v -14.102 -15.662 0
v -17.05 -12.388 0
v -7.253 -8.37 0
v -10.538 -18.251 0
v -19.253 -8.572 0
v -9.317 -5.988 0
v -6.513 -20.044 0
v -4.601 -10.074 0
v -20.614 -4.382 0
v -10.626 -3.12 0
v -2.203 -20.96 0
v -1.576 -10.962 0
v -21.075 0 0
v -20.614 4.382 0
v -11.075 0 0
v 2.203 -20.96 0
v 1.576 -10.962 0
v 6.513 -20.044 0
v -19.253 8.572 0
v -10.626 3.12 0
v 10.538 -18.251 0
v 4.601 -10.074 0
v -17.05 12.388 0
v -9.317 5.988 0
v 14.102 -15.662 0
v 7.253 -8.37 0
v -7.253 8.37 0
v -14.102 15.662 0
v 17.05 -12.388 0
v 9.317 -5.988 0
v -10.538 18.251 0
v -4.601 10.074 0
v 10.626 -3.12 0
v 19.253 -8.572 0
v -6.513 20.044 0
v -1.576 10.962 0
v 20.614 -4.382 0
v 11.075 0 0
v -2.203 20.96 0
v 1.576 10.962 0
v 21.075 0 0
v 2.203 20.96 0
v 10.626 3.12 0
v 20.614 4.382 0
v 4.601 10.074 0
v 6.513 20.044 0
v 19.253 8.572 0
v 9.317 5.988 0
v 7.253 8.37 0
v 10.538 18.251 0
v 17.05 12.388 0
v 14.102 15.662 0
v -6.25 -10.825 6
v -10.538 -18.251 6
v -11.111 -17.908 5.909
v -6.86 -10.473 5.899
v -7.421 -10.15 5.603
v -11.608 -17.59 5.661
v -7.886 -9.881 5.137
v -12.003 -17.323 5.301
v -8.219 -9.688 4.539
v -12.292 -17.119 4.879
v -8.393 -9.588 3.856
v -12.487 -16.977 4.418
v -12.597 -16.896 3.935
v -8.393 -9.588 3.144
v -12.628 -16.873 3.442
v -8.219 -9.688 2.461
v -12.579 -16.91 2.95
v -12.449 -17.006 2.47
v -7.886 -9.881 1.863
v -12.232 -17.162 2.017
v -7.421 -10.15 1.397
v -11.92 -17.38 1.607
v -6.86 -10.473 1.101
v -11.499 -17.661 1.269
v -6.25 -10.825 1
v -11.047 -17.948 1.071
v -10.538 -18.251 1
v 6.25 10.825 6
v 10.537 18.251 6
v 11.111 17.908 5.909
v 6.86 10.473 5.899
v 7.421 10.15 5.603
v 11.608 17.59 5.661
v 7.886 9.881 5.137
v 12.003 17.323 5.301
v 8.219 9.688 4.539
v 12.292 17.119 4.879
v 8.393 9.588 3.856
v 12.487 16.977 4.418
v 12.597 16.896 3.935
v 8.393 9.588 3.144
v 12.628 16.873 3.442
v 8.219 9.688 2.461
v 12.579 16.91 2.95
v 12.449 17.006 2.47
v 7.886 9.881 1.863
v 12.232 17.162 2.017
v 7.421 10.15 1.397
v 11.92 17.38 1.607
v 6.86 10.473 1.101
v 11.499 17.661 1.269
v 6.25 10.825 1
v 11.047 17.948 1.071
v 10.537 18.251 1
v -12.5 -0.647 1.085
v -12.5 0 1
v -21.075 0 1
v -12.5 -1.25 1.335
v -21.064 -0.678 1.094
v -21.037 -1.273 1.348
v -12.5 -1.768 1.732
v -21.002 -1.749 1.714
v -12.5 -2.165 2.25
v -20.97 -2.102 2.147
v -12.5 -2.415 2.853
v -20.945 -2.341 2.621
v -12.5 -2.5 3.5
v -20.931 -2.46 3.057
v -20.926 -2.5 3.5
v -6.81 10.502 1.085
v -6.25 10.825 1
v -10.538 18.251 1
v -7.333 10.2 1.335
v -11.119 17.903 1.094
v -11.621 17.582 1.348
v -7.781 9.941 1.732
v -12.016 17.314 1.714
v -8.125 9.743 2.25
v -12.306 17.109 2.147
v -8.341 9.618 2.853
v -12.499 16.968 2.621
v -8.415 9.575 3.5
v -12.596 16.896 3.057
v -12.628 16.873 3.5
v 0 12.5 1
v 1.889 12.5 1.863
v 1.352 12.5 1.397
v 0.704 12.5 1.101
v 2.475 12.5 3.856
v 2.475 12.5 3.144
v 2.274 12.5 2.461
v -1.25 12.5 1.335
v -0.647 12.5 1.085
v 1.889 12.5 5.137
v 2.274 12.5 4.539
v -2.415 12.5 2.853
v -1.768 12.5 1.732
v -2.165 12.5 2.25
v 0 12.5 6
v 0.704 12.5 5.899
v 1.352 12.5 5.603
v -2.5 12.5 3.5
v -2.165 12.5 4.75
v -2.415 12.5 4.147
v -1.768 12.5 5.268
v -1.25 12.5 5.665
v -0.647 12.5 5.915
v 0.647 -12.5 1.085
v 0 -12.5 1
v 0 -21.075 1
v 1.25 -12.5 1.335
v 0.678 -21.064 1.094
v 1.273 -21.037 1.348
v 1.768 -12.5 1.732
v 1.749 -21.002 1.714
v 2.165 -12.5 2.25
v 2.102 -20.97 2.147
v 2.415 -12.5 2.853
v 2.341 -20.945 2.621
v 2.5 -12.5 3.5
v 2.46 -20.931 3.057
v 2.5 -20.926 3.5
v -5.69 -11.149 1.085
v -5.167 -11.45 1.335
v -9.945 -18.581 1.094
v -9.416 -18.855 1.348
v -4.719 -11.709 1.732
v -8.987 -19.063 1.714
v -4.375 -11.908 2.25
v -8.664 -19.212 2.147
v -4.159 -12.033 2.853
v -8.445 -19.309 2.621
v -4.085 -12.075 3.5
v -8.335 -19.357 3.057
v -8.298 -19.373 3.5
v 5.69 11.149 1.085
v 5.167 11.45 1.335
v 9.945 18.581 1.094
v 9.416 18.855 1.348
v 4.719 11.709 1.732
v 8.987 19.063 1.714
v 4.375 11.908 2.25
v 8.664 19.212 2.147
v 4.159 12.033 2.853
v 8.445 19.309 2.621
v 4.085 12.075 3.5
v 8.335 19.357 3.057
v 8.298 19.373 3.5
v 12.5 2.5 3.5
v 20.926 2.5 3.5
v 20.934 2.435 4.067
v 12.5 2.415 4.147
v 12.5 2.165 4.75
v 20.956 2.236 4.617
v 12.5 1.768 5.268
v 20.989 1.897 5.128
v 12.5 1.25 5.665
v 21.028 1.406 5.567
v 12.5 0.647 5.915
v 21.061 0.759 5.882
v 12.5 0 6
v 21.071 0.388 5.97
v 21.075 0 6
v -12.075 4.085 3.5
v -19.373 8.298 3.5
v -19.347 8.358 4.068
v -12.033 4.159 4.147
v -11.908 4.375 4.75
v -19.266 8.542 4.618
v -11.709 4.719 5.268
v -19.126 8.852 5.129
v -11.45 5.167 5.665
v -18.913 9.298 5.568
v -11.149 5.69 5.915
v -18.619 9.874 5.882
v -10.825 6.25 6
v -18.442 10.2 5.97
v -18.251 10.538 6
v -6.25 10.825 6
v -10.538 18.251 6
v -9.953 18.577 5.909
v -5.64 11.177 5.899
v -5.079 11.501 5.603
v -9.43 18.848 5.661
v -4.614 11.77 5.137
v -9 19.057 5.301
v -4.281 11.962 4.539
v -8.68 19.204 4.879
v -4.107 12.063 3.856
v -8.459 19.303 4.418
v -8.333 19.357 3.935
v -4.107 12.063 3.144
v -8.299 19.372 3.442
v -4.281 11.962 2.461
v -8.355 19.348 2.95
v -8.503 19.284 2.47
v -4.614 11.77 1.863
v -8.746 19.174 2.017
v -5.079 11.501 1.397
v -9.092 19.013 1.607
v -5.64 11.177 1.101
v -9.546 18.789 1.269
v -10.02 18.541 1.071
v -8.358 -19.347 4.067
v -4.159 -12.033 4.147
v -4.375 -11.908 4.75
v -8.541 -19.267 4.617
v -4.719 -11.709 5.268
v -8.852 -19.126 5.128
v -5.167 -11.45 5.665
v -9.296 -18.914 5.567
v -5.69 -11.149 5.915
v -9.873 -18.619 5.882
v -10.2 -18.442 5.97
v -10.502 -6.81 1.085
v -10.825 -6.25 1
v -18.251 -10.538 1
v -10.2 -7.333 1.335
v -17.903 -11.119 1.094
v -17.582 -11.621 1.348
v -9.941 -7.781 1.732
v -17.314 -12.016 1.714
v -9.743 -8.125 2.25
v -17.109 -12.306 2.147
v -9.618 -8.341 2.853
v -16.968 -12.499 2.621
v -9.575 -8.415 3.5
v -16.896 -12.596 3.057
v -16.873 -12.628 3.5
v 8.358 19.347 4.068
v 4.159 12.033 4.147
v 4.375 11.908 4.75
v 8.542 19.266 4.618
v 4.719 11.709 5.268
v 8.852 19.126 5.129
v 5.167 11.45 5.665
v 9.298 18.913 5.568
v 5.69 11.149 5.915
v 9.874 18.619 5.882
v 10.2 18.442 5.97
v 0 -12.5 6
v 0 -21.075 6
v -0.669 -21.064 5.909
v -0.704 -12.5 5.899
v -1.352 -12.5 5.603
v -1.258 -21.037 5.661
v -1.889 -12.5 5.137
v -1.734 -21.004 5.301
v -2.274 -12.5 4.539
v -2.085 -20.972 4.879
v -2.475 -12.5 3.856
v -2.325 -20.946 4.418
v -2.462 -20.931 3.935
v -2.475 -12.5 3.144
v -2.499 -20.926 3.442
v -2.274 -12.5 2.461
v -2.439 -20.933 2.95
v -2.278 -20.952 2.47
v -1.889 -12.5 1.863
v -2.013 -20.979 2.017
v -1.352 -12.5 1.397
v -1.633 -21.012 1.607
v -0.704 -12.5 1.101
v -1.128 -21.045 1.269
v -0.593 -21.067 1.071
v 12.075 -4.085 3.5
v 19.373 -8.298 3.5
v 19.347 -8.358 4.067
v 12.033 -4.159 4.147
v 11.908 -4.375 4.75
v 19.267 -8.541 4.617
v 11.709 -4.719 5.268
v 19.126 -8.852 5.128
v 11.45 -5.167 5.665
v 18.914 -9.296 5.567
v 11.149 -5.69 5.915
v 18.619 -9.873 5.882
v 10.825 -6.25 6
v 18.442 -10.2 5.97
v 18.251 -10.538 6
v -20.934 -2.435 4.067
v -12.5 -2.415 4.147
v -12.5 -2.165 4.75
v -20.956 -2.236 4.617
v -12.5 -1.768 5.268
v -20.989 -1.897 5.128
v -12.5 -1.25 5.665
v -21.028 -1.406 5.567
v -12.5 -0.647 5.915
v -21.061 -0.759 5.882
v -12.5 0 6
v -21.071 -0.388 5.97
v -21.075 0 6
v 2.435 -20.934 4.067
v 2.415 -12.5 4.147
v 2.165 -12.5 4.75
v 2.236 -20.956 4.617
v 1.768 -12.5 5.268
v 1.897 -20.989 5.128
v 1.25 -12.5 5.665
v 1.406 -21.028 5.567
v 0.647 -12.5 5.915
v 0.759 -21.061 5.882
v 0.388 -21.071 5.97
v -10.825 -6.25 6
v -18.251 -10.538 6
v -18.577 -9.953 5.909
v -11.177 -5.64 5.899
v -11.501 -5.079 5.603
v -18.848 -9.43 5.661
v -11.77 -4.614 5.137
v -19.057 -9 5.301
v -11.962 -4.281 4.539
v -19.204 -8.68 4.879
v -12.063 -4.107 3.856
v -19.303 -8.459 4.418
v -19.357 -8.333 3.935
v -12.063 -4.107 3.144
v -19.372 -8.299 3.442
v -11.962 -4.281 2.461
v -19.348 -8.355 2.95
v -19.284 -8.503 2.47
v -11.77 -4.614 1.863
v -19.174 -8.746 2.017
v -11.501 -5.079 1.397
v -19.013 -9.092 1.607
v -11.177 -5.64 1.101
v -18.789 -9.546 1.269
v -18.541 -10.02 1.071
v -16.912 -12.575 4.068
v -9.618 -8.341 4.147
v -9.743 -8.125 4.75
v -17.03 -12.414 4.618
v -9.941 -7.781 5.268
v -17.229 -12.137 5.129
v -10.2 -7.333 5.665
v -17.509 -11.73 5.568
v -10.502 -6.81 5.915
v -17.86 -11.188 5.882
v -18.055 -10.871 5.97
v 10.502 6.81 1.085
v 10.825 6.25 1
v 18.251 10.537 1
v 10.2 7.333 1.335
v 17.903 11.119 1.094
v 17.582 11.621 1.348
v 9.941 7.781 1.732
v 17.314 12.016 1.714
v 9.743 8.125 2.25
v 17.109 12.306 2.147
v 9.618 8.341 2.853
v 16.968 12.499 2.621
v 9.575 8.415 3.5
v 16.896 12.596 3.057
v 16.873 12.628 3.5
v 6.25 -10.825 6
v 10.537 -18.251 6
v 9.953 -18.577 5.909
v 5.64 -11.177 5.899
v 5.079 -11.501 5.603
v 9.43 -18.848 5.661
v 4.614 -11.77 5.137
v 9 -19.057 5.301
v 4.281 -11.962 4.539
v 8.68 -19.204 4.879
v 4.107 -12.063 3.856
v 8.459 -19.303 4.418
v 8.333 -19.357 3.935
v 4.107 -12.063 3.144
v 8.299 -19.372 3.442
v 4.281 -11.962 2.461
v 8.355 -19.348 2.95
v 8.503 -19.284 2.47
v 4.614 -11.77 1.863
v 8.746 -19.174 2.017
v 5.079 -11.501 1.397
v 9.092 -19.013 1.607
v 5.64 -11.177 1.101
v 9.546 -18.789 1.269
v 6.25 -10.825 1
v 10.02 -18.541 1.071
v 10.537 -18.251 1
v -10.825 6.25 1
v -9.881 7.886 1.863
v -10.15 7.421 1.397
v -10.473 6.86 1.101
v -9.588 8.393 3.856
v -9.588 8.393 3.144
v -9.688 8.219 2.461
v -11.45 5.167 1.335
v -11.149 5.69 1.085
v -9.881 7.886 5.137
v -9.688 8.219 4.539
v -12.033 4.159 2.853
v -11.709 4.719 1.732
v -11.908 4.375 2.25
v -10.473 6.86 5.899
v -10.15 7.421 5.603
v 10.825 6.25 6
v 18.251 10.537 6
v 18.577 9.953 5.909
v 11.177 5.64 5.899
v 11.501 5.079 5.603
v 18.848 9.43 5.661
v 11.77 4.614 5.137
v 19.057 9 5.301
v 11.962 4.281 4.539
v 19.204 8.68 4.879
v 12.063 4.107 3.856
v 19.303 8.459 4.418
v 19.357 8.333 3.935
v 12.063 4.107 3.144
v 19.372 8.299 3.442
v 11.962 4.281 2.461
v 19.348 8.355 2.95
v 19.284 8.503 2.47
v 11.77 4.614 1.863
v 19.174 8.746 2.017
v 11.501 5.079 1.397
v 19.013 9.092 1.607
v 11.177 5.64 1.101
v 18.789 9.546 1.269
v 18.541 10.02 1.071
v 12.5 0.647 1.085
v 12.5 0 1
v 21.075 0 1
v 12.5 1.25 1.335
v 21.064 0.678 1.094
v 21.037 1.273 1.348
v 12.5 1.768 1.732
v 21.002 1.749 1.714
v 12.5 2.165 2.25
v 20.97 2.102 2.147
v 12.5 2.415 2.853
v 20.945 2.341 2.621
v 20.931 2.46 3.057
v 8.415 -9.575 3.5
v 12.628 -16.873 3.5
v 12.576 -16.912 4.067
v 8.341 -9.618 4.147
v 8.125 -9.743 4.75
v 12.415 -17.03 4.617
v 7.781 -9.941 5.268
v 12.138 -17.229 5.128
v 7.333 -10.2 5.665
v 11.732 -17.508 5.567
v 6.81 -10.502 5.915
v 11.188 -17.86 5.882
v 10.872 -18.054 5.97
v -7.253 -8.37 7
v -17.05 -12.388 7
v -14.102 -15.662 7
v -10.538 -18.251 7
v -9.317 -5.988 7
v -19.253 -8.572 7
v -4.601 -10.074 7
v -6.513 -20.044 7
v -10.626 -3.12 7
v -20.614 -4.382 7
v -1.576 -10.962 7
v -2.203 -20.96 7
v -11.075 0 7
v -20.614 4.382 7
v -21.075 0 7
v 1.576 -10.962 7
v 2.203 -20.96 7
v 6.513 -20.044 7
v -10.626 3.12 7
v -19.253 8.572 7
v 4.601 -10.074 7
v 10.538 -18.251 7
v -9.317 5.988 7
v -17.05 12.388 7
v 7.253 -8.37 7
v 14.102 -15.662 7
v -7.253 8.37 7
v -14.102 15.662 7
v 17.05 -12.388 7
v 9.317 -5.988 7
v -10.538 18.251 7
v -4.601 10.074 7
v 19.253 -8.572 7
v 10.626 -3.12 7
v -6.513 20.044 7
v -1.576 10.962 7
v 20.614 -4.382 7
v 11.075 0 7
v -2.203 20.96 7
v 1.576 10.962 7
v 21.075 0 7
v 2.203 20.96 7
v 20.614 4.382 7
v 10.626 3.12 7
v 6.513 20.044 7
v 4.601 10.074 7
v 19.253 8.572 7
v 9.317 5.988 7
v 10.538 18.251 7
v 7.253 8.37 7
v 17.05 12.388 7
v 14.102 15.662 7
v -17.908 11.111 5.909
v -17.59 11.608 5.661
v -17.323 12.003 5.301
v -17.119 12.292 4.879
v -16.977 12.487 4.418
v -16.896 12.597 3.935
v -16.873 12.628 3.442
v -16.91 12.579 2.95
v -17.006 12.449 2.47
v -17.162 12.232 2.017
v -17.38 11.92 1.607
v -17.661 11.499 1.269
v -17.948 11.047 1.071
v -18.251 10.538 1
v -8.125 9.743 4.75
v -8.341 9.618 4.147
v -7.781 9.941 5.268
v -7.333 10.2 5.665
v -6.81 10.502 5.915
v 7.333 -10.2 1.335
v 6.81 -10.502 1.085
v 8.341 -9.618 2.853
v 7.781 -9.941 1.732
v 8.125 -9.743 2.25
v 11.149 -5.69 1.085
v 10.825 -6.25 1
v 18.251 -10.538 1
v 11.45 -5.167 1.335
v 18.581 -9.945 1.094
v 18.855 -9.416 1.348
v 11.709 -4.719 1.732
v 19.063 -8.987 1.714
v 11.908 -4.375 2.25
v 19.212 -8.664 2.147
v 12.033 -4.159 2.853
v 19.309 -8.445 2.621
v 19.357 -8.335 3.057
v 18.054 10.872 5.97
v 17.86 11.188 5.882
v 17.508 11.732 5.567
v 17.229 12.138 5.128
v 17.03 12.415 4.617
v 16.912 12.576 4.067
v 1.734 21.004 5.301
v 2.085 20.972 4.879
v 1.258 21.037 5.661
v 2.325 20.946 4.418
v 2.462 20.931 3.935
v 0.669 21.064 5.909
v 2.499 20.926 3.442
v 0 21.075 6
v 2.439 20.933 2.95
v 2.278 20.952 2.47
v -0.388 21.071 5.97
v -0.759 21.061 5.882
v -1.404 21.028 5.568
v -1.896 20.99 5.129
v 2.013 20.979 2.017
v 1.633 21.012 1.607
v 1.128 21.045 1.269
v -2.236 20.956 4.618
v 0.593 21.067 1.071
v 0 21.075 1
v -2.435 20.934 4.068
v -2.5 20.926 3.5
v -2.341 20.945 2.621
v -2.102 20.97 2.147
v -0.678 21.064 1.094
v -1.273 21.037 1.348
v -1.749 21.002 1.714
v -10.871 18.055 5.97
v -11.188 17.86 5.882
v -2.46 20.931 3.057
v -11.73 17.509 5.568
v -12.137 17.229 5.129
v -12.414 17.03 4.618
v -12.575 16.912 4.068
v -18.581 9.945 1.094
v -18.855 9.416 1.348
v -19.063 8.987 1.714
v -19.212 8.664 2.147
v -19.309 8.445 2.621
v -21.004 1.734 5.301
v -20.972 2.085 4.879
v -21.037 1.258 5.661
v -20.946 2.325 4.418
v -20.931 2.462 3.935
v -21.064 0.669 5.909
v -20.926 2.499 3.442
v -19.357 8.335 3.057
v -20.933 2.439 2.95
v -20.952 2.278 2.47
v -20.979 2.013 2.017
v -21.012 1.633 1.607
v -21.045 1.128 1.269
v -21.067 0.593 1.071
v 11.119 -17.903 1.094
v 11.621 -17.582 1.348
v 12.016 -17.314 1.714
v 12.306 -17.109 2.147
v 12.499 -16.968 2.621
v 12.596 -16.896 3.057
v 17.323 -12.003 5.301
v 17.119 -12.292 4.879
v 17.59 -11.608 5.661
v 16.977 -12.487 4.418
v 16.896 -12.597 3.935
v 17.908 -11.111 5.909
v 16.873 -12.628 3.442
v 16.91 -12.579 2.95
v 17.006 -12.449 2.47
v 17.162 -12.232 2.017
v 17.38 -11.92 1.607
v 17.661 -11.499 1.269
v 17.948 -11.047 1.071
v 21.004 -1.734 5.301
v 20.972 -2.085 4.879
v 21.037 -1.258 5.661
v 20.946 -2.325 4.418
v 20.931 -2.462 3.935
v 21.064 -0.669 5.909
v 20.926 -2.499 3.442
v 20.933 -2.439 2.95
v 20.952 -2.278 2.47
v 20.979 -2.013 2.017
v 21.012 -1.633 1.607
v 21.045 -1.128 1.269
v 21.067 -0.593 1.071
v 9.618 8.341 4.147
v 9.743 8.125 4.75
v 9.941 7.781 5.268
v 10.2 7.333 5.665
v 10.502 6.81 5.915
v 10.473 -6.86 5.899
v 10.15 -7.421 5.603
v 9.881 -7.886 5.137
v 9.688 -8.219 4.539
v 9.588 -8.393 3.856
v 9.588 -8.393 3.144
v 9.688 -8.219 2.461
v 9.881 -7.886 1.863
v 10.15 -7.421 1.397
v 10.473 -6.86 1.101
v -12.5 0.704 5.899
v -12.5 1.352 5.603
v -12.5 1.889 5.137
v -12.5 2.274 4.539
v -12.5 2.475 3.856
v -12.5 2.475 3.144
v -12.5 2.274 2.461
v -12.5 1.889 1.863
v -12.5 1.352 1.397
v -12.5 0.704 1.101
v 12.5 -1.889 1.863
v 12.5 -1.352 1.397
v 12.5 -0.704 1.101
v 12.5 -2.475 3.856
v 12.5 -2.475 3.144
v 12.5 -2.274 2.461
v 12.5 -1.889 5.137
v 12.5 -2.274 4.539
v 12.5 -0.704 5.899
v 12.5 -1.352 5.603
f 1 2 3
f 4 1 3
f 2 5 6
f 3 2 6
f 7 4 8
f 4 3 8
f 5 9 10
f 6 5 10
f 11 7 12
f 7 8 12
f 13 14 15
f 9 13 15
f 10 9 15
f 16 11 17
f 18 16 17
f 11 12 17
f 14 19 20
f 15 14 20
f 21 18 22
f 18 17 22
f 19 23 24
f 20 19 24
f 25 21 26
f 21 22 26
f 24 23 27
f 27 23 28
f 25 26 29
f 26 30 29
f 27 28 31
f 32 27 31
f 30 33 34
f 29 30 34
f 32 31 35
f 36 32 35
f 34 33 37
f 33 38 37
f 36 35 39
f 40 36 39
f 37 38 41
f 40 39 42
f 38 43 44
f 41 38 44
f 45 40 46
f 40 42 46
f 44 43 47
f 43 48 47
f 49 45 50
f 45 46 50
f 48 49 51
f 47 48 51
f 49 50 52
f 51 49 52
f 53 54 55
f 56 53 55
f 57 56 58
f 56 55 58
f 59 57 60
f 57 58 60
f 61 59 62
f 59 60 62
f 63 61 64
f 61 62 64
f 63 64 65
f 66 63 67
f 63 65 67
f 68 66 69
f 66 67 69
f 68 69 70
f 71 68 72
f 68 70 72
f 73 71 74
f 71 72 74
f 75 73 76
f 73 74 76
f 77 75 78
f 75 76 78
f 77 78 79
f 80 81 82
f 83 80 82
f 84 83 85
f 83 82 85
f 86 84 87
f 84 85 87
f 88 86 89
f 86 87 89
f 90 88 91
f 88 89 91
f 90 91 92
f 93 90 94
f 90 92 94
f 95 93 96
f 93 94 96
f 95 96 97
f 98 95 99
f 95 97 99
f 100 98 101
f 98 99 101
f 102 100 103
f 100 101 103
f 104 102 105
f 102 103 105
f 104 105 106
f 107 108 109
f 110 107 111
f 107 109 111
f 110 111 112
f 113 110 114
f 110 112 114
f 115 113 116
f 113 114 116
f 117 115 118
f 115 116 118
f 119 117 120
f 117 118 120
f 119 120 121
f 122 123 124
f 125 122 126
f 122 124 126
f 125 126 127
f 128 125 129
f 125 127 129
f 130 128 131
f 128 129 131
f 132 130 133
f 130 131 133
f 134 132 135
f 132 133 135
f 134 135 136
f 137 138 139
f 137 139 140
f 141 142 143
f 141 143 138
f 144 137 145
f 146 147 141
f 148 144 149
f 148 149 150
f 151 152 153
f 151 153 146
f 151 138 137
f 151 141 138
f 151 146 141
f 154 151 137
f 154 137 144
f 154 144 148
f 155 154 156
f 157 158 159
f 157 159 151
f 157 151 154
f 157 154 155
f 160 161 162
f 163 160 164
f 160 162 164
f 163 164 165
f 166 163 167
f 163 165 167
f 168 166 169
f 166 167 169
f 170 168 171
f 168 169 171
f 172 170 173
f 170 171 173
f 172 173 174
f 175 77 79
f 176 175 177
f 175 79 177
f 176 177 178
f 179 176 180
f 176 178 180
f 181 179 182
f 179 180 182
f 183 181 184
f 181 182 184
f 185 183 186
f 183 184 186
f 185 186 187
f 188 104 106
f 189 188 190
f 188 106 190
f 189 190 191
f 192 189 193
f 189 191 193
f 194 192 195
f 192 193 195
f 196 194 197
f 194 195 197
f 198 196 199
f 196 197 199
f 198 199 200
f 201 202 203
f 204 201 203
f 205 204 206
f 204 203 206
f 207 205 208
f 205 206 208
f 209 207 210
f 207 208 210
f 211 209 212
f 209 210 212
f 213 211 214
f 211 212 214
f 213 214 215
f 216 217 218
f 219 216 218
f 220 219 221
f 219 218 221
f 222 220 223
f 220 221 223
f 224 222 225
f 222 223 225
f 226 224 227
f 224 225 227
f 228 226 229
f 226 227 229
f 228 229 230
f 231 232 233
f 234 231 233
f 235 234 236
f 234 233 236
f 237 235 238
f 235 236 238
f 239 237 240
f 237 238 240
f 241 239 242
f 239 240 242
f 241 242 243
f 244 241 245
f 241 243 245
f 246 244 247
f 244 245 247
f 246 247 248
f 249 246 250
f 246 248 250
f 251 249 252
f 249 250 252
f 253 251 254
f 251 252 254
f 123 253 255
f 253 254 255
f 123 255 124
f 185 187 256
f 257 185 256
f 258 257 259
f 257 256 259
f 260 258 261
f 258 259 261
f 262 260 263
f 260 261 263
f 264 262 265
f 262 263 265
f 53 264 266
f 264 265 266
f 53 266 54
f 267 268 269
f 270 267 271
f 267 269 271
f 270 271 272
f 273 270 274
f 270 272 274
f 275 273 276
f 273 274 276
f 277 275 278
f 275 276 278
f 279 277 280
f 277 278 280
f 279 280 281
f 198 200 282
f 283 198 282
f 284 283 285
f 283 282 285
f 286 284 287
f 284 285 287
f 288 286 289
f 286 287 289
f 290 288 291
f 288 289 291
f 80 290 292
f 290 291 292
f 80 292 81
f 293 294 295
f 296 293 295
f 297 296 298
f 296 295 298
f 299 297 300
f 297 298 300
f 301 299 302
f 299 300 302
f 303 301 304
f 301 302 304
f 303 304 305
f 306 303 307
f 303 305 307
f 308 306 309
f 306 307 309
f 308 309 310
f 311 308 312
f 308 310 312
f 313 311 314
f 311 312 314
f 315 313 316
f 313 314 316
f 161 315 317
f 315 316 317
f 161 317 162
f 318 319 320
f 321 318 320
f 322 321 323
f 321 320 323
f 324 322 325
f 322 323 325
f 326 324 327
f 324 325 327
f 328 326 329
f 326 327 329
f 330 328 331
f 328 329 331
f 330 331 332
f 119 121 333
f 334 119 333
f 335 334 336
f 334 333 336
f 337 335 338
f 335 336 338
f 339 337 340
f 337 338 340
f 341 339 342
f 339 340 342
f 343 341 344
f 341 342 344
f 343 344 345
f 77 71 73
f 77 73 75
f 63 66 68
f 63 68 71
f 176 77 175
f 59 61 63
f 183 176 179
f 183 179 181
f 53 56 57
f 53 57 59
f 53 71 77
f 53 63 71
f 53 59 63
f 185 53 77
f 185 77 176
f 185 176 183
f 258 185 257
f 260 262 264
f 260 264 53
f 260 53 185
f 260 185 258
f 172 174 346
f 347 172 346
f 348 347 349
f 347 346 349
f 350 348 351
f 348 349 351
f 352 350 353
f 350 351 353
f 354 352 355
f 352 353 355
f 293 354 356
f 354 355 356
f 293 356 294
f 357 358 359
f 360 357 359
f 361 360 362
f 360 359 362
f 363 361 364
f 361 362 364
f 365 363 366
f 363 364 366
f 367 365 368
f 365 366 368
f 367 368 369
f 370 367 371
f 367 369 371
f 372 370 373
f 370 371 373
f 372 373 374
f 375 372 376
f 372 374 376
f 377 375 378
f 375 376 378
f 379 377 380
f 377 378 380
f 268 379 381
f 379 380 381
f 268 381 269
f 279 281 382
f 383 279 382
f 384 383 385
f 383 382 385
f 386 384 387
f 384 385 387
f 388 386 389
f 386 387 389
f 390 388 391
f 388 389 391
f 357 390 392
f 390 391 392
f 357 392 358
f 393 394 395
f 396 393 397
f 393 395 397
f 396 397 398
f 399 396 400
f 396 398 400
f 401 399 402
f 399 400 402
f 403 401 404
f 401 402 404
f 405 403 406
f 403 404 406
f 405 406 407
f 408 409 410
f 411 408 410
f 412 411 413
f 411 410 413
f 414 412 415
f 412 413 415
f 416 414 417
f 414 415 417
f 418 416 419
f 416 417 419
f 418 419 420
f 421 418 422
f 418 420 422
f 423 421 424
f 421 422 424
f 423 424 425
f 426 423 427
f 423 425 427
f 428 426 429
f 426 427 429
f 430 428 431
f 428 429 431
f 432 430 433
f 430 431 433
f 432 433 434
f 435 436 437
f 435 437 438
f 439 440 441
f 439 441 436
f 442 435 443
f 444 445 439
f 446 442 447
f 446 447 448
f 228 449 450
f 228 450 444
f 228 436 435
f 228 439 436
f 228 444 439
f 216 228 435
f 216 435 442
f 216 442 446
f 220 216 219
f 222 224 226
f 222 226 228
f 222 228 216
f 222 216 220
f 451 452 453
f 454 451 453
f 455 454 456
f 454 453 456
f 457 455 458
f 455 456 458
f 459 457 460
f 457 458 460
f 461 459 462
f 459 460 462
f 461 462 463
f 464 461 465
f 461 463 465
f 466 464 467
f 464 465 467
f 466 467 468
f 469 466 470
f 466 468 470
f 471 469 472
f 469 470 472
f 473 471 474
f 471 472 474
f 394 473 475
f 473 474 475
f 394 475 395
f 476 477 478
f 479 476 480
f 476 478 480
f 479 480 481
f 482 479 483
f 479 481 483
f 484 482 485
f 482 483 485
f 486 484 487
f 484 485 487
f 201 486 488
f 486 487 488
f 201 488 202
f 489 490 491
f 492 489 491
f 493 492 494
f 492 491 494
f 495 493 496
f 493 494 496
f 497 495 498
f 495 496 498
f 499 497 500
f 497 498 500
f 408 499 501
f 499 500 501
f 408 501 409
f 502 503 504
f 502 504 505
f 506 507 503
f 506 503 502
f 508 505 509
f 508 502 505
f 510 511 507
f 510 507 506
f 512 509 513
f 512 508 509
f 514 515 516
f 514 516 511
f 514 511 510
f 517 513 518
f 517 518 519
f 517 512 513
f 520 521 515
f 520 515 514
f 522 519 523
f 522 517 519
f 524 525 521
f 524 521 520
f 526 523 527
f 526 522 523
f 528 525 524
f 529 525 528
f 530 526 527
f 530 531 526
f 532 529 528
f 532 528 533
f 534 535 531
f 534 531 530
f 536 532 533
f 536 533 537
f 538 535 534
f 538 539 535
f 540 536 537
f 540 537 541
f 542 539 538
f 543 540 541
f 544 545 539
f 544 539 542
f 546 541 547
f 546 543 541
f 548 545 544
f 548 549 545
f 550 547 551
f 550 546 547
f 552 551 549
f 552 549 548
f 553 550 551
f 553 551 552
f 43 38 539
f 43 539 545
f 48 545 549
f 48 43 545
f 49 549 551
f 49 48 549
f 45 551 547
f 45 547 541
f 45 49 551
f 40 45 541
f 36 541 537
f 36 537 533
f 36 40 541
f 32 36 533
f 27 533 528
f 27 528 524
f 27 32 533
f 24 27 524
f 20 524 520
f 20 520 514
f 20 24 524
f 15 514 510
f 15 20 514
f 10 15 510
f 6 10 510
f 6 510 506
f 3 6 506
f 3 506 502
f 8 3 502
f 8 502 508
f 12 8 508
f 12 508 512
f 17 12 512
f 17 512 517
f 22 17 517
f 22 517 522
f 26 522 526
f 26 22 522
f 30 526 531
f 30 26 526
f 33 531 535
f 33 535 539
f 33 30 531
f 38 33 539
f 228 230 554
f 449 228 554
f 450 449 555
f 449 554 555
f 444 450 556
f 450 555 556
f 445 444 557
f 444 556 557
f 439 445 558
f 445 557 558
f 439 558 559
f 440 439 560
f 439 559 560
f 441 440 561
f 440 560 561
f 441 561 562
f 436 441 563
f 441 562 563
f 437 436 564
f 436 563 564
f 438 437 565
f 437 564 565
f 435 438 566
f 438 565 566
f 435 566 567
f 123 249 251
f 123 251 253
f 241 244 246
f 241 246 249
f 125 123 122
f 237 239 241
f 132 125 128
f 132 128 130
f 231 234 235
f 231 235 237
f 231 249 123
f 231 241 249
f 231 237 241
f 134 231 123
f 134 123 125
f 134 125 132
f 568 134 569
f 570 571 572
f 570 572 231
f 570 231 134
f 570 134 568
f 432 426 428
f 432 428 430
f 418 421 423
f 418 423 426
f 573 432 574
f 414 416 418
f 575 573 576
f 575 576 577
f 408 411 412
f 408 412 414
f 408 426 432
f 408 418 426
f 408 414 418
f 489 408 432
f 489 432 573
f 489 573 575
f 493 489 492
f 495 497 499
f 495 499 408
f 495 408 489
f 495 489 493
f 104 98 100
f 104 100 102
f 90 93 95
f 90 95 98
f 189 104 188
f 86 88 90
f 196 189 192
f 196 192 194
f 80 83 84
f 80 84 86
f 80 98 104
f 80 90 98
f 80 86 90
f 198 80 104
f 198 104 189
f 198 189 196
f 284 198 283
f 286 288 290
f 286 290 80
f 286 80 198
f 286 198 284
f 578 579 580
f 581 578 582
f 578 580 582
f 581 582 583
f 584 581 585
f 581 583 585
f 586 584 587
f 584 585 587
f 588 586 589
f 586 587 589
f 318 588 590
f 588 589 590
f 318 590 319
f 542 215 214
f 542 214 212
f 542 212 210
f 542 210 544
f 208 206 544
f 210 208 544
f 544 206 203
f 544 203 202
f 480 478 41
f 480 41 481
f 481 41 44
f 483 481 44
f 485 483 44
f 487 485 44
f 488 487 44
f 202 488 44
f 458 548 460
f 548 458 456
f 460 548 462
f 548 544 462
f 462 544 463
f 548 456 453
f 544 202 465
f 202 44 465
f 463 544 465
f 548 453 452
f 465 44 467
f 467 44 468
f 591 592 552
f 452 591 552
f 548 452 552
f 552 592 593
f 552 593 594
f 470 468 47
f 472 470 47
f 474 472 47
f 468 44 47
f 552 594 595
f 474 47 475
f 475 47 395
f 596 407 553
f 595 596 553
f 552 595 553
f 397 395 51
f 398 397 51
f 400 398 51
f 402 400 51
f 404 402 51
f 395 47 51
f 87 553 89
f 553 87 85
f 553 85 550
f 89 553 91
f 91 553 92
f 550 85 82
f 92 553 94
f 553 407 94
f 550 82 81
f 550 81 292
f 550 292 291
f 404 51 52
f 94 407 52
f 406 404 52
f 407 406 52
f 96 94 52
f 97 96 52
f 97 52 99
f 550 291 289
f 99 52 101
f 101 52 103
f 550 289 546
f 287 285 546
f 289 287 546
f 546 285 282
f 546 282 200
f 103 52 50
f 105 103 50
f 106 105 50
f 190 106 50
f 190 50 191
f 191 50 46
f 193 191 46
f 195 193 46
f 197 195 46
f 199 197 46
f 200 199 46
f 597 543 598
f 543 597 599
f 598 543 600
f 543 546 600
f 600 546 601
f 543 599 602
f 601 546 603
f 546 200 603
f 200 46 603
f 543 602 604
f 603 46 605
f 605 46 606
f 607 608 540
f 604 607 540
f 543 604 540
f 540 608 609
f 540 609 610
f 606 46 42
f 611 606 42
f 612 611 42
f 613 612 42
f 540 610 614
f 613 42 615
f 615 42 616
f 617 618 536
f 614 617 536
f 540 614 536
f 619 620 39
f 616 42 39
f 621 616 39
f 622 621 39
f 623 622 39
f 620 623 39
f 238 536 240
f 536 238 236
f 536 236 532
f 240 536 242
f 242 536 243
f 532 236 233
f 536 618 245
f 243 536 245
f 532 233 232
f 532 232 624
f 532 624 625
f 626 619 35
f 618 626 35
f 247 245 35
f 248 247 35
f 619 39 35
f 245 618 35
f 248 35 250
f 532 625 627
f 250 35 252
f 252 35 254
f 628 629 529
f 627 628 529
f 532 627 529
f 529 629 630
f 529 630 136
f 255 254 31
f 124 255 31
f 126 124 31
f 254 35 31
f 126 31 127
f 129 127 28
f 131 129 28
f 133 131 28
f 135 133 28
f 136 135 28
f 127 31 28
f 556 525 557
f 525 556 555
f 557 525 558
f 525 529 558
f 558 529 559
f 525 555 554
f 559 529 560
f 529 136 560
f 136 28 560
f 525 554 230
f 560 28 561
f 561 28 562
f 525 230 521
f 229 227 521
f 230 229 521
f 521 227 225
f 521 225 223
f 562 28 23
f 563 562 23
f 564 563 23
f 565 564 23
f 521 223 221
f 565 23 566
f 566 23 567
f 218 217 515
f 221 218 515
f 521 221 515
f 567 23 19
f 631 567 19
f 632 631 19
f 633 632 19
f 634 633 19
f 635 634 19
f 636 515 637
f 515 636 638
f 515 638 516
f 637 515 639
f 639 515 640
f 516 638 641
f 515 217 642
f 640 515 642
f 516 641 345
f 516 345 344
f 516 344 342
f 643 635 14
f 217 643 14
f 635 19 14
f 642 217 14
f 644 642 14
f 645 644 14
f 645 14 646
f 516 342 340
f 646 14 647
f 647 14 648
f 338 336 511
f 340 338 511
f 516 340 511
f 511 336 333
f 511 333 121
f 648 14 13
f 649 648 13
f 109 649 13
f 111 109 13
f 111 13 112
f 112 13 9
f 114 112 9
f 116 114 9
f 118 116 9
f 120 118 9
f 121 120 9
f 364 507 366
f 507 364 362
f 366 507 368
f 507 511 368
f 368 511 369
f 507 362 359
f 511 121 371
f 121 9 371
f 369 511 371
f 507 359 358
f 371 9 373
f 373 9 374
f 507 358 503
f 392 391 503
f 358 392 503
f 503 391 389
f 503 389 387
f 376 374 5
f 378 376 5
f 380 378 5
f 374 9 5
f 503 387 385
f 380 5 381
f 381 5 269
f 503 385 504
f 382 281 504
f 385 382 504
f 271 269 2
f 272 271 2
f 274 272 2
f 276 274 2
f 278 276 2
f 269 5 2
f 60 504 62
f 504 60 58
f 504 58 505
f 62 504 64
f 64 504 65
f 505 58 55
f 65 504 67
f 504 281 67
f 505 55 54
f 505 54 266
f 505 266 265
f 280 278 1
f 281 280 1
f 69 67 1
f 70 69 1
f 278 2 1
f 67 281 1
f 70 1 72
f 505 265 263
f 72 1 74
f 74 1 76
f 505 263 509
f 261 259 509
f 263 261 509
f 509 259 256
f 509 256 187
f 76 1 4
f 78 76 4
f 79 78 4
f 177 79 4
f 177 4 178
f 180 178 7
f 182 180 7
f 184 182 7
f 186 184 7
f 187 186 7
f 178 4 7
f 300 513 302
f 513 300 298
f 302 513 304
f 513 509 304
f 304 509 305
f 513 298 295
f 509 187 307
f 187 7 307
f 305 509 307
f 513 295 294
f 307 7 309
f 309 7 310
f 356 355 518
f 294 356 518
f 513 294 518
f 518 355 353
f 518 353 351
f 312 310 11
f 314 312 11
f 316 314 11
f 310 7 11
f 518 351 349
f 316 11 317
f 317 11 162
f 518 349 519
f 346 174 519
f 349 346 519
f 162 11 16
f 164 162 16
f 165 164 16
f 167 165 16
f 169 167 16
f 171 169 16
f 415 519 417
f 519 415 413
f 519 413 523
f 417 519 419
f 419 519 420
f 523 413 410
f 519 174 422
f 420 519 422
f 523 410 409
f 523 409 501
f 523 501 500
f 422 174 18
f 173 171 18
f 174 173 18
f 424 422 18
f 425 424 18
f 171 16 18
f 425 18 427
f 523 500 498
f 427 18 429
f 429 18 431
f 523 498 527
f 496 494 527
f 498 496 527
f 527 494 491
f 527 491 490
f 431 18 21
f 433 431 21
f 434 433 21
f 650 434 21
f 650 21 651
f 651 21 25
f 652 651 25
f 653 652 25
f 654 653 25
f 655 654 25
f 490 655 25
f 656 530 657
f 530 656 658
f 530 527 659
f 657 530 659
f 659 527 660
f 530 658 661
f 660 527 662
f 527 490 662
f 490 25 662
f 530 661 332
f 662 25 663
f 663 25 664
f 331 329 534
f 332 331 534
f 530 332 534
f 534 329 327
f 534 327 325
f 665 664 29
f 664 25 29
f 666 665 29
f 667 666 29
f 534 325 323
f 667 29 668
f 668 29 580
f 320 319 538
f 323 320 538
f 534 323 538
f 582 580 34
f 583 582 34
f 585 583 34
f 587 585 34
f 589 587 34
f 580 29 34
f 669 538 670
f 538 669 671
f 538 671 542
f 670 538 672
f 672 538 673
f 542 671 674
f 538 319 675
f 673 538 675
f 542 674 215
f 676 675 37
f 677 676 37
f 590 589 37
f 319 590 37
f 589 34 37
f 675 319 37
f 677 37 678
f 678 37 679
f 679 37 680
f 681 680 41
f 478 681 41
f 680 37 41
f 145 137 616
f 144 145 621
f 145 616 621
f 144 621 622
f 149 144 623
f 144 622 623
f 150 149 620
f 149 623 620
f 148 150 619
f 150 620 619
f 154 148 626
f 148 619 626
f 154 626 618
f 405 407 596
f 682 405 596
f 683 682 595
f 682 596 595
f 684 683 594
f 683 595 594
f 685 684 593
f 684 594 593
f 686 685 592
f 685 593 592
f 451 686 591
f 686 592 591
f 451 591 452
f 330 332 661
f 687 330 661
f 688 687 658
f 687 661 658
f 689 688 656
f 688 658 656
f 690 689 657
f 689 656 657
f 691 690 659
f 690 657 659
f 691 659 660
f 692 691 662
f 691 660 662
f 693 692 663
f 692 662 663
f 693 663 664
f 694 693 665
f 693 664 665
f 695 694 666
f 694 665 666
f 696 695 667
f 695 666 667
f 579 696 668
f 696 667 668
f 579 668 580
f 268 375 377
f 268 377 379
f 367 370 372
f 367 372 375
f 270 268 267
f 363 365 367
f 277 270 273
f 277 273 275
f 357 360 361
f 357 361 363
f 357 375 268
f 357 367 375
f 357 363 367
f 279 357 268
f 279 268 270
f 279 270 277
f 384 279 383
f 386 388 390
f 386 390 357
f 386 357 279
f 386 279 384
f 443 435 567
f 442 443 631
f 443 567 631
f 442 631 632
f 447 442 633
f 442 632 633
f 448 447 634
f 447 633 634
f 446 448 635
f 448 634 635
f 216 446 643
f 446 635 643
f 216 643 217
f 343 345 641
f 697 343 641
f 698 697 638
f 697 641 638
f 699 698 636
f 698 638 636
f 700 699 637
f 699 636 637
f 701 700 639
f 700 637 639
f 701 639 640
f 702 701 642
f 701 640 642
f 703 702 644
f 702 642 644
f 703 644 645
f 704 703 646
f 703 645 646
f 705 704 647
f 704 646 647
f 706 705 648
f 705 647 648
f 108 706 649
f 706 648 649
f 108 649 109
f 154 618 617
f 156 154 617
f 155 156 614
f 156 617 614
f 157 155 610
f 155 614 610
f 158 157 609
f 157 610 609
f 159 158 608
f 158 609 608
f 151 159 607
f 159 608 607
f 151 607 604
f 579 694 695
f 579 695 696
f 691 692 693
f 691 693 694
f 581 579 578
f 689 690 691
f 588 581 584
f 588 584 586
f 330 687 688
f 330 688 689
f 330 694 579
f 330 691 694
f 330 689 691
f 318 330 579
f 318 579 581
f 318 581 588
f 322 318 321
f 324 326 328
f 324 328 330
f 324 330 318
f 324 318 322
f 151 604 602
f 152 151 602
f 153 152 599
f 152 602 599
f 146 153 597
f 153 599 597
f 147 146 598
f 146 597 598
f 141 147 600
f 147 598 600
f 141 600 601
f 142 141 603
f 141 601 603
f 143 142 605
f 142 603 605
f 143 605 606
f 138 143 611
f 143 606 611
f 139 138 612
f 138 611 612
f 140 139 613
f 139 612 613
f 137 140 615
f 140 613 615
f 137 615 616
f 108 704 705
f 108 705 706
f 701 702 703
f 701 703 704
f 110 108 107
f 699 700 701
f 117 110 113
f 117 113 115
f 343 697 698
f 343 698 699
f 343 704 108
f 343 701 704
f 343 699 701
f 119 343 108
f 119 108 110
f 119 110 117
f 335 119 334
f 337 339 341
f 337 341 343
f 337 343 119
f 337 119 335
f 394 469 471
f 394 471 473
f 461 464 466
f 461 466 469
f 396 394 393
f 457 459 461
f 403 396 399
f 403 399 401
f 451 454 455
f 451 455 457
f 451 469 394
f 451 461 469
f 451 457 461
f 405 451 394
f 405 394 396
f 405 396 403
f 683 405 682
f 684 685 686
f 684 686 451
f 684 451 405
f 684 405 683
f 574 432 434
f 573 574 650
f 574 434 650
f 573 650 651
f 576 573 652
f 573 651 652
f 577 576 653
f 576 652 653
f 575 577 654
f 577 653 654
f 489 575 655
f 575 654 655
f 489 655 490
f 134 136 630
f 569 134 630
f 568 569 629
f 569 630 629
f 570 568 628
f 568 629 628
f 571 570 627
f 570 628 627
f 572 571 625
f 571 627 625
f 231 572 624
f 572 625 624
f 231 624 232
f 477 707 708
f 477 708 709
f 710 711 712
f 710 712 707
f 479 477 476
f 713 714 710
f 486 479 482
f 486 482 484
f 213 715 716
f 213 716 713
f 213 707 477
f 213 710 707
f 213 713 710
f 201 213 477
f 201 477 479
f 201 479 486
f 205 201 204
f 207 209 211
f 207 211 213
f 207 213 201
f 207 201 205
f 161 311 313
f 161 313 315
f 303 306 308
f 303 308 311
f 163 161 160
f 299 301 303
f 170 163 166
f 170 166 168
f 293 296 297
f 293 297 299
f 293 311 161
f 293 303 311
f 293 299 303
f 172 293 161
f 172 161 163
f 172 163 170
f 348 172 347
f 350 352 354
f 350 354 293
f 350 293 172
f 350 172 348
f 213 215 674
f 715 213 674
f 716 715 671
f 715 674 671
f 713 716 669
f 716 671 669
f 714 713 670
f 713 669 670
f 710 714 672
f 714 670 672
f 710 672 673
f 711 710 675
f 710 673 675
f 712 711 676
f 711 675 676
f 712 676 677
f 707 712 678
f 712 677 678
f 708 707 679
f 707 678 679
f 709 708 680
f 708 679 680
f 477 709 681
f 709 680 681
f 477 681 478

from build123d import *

# Parameters (mm, degrees)
F0_R            = 21.075
F0_R_2          = 11.075
F1_DEPTH        = 7
F4_DEPTH        = 12.5
F4_COPIES_COUNT = 12


# Not quite as in the source:
# - a pattern or mirror of a feature is missing from the dataset's text; its kind, count and spacing are read off the source's solid


with BuildPart() as f1:
    # F0 (on Top) → F1 (new body)
    with BuildSketch(Plane.XY):
        Circle(F0_R)
        Circle(F0_R_2, mode=Mode.SUBTRACT)
    extrude(amount=F1_DEPTH)

    # F3 (on offset) → F4 (cut)
    with BuildSketch(Plane.XZ.offset(25)):
        with BuildLine():
            Line((0, 1), (0, 6))
            ThreePointArc((0, 6), (-2.5, 3.5), (0, 1))
        make_face()
        with BuildLine():
            ThreePointArc((0, 1), (1.767766953, 1.732233047), (2.5, 3.5))
            ThreePointArc((2.5, 3.5), (1.767766953, 5.267766953), (0, 6))
            Line((0, 6), (0, 1))
        make_face()
    f4 = extrude(amount=-F4_DEPTH, mode=Mode.SUBTRACT)

    # F4_copies: F4 ×12 about axis
    f4_copies_axis = Axis((0, 0, 0), (0, 0, 1))
    for i in range(1, F4_COPIES_COUNT):
        add(f4.rotate(f4_copies_axis, i * 360 / F4_COPIES_COUNT), mode=Mode.SUBTRACT)


solid = f1.part
